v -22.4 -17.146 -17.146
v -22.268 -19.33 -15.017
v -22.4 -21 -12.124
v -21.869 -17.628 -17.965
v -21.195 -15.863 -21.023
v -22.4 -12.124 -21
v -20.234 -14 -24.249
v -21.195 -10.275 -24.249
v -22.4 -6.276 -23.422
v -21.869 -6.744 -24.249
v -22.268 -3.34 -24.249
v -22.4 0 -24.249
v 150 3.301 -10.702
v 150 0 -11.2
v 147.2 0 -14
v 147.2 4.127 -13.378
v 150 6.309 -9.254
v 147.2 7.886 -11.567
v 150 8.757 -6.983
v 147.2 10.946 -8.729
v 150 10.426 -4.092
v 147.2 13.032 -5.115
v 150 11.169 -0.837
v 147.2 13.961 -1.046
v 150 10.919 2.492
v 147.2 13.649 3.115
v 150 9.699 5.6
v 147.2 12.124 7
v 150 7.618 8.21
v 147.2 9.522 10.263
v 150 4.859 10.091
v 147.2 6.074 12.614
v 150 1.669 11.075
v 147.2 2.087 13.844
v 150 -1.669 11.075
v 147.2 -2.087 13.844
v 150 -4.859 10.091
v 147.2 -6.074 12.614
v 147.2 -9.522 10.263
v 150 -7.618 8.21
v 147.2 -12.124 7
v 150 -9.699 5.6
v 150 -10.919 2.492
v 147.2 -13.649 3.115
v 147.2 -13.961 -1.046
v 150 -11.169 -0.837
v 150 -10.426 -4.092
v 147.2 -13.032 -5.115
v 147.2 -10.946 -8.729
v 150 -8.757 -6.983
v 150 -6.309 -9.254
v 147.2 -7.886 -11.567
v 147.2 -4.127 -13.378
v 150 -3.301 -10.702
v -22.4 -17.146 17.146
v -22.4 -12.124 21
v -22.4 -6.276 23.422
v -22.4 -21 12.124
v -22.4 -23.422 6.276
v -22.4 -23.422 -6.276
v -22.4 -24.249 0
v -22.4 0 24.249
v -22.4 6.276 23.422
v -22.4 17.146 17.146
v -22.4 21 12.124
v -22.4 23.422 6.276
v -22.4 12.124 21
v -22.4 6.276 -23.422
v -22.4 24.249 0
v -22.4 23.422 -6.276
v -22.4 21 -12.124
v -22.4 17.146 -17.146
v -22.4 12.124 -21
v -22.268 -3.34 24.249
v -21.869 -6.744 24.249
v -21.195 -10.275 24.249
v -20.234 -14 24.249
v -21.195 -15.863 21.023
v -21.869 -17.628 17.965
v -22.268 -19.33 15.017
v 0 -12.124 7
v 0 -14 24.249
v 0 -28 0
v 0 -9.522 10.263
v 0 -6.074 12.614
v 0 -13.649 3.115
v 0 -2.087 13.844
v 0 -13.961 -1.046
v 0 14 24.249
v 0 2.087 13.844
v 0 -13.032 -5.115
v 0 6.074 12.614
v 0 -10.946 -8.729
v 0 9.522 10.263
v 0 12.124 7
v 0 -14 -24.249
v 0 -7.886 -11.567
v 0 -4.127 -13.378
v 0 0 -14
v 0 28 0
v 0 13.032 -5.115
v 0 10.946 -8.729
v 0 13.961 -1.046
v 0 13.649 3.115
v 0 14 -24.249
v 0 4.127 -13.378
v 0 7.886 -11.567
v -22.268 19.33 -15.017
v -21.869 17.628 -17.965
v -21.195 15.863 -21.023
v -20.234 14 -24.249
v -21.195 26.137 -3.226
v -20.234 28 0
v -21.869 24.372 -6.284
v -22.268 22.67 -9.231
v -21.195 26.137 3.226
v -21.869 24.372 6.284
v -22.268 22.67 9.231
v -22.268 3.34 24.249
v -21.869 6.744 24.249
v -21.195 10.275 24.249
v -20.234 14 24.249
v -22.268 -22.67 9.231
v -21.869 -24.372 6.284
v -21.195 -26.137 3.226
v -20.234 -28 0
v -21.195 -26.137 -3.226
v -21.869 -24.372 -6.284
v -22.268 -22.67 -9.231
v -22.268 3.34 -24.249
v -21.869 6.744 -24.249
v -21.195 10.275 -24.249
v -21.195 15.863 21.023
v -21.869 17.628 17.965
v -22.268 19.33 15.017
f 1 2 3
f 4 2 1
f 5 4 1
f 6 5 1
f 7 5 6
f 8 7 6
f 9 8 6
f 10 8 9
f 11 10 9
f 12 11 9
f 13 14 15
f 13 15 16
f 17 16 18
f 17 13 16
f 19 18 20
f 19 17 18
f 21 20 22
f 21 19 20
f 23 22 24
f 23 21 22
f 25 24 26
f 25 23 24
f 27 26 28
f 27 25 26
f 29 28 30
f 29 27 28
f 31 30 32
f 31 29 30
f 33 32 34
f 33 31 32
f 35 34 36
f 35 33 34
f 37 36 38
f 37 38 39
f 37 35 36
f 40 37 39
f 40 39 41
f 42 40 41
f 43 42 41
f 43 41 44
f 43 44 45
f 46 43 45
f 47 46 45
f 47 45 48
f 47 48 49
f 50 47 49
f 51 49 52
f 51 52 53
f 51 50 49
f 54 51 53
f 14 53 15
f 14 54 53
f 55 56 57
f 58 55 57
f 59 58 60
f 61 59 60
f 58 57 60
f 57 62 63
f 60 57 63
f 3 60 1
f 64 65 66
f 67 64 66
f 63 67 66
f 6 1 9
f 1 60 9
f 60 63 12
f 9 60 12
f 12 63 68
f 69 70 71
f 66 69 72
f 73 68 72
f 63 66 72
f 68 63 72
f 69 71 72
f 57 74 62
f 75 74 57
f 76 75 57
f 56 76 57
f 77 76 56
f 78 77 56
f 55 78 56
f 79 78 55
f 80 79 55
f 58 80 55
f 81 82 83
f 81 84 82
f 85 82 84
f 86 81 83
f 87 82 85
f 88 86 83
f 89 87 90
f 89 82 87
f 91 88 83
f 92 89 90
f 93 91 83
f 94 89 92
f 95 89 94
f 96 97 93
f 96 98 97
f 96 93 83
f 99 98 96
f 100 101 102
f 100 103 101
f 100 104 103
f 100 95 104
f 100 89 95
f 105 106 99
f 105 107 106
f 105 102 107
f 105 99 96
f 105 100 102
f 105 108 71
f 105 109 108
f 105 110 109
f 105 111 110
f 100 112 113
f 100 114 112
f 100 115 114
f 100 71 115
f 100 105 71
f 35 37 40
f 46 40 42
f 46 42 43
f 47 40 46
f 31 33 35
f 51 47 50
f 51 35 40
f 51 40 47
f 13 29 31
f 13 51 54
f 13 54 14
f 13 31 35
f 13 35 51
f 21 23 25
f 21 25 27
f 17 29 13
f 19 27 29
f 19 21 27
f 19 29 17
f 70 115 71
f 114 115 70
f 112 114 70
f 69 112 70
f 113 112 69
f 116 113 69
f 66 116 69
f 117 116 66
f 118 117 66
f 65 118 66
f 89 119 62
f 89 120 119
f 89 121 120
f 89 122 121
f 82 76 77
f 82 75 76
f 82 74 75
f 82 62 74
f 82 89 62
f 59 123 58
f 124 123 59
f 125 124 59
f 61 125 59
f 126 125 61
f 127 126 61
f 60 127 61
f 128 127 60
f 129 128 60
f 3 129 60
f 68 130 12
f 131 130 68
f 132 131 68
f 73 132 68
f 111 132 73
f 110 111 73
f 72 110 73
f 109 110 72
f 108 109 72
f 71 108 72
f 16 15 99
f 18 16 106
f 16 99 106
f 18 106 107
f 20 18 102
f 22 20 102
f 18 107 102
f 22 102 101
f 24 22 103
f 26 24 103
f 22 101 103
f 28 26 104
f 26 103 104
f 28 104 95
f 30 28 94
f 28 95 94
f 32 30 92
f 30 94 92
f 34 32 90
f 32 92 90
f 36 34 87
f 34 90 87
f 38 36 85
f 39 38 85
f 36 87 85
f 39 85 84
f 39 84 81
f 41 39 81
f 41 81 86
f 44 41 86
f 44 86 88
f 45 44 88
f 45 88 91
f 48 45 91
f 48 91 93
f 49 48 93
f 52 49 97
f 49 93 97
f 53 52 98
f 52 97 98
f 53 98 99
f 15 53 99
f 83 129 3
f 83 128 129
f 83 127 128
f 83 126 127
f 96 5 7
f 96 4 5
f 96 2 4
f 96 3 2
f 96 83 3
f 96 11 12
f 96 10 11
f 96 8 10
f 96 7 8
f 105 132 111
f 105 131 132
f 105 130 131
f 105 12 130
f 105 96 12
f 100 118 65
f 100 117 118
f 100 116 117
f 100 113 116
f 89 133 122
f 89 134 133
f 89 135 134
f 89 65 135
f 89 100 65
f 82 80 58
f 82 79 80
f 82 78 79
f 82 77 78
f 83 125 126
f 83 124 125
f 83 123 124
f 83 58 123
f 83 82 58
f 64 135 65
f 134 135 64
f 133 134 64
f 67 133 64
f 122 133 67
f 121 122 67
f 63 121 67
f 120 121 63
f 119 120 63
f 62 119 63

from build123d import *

# Parameters (mm, degrees)
BOSS_EXTRUDE1_DEPTH = 22.4
SKETCH2_R           = 14
BOSS_EXTRUDE2_DEPTH = 150
CHAMFER1_SIZE       = 2.8
SKETCH3_OUTSIDE_W   = 607.642
SKETCH3_OUTSIDE_H   = 615.144
SKETCH3_OUTSIDE_R   = 24.248711306
CUT_EXTRUDE1_DEPTH  = 150
CUT_EXTRUDE1_TAPER  = 60


with BuildPart() as part:
    # Sketch1 → Boss-Extrude1 (new body)
    with BuildSketch(Plane(origin=(0, 0, 0), x_dir=(0, 0, -1), z_dir=(1, 0, 0))):
        Polygon((0, 28), (-24.248711306, 14), (-24.248711306, -14), (0, -28), (24.248711306, -14), (24.248711306, 14), align=None)
    extrude(amount=-BOSS_EXTRUDE1_DEPTH)

    # Sketch2 → Boss-Extrude2 (add)
    with BuildSketch(Plane(origin=(0, 0, 0), x_dir=(0, 0, -1), z_dir=(1, 0, 0))):
        Circle(SKETCH2_R)
    extrude(amount=BOSS_EXTRUDE2_DEPTH)

    # Chamfer1
    chamfer1_edges = [part.edges().sort_by_distance(p)[0] for p in [
        (150, 0, 14),
    ]]
    chamfer(chamfer1_edges, length=CHAMFER1_SIZE)

    # Sketch3 outside → Cut-Extrude1 (cut)
    with BuildSketch(Plane.ZY.offset(22.4)):
        Rectangle(SKETCH3_OUTSIDE_W, SKETCH3_OUTSIDE_H)
        Circle(SKETCH3_OUTSIDE_R, mode=Mode.SUBTRACT)
    extrude(amount=-CUT_EXTRUDE1_DEPTH, taper=CUT_EXTRUDE1_TAPER, mode=Mode.SUBTRACT)


solid = part.part
